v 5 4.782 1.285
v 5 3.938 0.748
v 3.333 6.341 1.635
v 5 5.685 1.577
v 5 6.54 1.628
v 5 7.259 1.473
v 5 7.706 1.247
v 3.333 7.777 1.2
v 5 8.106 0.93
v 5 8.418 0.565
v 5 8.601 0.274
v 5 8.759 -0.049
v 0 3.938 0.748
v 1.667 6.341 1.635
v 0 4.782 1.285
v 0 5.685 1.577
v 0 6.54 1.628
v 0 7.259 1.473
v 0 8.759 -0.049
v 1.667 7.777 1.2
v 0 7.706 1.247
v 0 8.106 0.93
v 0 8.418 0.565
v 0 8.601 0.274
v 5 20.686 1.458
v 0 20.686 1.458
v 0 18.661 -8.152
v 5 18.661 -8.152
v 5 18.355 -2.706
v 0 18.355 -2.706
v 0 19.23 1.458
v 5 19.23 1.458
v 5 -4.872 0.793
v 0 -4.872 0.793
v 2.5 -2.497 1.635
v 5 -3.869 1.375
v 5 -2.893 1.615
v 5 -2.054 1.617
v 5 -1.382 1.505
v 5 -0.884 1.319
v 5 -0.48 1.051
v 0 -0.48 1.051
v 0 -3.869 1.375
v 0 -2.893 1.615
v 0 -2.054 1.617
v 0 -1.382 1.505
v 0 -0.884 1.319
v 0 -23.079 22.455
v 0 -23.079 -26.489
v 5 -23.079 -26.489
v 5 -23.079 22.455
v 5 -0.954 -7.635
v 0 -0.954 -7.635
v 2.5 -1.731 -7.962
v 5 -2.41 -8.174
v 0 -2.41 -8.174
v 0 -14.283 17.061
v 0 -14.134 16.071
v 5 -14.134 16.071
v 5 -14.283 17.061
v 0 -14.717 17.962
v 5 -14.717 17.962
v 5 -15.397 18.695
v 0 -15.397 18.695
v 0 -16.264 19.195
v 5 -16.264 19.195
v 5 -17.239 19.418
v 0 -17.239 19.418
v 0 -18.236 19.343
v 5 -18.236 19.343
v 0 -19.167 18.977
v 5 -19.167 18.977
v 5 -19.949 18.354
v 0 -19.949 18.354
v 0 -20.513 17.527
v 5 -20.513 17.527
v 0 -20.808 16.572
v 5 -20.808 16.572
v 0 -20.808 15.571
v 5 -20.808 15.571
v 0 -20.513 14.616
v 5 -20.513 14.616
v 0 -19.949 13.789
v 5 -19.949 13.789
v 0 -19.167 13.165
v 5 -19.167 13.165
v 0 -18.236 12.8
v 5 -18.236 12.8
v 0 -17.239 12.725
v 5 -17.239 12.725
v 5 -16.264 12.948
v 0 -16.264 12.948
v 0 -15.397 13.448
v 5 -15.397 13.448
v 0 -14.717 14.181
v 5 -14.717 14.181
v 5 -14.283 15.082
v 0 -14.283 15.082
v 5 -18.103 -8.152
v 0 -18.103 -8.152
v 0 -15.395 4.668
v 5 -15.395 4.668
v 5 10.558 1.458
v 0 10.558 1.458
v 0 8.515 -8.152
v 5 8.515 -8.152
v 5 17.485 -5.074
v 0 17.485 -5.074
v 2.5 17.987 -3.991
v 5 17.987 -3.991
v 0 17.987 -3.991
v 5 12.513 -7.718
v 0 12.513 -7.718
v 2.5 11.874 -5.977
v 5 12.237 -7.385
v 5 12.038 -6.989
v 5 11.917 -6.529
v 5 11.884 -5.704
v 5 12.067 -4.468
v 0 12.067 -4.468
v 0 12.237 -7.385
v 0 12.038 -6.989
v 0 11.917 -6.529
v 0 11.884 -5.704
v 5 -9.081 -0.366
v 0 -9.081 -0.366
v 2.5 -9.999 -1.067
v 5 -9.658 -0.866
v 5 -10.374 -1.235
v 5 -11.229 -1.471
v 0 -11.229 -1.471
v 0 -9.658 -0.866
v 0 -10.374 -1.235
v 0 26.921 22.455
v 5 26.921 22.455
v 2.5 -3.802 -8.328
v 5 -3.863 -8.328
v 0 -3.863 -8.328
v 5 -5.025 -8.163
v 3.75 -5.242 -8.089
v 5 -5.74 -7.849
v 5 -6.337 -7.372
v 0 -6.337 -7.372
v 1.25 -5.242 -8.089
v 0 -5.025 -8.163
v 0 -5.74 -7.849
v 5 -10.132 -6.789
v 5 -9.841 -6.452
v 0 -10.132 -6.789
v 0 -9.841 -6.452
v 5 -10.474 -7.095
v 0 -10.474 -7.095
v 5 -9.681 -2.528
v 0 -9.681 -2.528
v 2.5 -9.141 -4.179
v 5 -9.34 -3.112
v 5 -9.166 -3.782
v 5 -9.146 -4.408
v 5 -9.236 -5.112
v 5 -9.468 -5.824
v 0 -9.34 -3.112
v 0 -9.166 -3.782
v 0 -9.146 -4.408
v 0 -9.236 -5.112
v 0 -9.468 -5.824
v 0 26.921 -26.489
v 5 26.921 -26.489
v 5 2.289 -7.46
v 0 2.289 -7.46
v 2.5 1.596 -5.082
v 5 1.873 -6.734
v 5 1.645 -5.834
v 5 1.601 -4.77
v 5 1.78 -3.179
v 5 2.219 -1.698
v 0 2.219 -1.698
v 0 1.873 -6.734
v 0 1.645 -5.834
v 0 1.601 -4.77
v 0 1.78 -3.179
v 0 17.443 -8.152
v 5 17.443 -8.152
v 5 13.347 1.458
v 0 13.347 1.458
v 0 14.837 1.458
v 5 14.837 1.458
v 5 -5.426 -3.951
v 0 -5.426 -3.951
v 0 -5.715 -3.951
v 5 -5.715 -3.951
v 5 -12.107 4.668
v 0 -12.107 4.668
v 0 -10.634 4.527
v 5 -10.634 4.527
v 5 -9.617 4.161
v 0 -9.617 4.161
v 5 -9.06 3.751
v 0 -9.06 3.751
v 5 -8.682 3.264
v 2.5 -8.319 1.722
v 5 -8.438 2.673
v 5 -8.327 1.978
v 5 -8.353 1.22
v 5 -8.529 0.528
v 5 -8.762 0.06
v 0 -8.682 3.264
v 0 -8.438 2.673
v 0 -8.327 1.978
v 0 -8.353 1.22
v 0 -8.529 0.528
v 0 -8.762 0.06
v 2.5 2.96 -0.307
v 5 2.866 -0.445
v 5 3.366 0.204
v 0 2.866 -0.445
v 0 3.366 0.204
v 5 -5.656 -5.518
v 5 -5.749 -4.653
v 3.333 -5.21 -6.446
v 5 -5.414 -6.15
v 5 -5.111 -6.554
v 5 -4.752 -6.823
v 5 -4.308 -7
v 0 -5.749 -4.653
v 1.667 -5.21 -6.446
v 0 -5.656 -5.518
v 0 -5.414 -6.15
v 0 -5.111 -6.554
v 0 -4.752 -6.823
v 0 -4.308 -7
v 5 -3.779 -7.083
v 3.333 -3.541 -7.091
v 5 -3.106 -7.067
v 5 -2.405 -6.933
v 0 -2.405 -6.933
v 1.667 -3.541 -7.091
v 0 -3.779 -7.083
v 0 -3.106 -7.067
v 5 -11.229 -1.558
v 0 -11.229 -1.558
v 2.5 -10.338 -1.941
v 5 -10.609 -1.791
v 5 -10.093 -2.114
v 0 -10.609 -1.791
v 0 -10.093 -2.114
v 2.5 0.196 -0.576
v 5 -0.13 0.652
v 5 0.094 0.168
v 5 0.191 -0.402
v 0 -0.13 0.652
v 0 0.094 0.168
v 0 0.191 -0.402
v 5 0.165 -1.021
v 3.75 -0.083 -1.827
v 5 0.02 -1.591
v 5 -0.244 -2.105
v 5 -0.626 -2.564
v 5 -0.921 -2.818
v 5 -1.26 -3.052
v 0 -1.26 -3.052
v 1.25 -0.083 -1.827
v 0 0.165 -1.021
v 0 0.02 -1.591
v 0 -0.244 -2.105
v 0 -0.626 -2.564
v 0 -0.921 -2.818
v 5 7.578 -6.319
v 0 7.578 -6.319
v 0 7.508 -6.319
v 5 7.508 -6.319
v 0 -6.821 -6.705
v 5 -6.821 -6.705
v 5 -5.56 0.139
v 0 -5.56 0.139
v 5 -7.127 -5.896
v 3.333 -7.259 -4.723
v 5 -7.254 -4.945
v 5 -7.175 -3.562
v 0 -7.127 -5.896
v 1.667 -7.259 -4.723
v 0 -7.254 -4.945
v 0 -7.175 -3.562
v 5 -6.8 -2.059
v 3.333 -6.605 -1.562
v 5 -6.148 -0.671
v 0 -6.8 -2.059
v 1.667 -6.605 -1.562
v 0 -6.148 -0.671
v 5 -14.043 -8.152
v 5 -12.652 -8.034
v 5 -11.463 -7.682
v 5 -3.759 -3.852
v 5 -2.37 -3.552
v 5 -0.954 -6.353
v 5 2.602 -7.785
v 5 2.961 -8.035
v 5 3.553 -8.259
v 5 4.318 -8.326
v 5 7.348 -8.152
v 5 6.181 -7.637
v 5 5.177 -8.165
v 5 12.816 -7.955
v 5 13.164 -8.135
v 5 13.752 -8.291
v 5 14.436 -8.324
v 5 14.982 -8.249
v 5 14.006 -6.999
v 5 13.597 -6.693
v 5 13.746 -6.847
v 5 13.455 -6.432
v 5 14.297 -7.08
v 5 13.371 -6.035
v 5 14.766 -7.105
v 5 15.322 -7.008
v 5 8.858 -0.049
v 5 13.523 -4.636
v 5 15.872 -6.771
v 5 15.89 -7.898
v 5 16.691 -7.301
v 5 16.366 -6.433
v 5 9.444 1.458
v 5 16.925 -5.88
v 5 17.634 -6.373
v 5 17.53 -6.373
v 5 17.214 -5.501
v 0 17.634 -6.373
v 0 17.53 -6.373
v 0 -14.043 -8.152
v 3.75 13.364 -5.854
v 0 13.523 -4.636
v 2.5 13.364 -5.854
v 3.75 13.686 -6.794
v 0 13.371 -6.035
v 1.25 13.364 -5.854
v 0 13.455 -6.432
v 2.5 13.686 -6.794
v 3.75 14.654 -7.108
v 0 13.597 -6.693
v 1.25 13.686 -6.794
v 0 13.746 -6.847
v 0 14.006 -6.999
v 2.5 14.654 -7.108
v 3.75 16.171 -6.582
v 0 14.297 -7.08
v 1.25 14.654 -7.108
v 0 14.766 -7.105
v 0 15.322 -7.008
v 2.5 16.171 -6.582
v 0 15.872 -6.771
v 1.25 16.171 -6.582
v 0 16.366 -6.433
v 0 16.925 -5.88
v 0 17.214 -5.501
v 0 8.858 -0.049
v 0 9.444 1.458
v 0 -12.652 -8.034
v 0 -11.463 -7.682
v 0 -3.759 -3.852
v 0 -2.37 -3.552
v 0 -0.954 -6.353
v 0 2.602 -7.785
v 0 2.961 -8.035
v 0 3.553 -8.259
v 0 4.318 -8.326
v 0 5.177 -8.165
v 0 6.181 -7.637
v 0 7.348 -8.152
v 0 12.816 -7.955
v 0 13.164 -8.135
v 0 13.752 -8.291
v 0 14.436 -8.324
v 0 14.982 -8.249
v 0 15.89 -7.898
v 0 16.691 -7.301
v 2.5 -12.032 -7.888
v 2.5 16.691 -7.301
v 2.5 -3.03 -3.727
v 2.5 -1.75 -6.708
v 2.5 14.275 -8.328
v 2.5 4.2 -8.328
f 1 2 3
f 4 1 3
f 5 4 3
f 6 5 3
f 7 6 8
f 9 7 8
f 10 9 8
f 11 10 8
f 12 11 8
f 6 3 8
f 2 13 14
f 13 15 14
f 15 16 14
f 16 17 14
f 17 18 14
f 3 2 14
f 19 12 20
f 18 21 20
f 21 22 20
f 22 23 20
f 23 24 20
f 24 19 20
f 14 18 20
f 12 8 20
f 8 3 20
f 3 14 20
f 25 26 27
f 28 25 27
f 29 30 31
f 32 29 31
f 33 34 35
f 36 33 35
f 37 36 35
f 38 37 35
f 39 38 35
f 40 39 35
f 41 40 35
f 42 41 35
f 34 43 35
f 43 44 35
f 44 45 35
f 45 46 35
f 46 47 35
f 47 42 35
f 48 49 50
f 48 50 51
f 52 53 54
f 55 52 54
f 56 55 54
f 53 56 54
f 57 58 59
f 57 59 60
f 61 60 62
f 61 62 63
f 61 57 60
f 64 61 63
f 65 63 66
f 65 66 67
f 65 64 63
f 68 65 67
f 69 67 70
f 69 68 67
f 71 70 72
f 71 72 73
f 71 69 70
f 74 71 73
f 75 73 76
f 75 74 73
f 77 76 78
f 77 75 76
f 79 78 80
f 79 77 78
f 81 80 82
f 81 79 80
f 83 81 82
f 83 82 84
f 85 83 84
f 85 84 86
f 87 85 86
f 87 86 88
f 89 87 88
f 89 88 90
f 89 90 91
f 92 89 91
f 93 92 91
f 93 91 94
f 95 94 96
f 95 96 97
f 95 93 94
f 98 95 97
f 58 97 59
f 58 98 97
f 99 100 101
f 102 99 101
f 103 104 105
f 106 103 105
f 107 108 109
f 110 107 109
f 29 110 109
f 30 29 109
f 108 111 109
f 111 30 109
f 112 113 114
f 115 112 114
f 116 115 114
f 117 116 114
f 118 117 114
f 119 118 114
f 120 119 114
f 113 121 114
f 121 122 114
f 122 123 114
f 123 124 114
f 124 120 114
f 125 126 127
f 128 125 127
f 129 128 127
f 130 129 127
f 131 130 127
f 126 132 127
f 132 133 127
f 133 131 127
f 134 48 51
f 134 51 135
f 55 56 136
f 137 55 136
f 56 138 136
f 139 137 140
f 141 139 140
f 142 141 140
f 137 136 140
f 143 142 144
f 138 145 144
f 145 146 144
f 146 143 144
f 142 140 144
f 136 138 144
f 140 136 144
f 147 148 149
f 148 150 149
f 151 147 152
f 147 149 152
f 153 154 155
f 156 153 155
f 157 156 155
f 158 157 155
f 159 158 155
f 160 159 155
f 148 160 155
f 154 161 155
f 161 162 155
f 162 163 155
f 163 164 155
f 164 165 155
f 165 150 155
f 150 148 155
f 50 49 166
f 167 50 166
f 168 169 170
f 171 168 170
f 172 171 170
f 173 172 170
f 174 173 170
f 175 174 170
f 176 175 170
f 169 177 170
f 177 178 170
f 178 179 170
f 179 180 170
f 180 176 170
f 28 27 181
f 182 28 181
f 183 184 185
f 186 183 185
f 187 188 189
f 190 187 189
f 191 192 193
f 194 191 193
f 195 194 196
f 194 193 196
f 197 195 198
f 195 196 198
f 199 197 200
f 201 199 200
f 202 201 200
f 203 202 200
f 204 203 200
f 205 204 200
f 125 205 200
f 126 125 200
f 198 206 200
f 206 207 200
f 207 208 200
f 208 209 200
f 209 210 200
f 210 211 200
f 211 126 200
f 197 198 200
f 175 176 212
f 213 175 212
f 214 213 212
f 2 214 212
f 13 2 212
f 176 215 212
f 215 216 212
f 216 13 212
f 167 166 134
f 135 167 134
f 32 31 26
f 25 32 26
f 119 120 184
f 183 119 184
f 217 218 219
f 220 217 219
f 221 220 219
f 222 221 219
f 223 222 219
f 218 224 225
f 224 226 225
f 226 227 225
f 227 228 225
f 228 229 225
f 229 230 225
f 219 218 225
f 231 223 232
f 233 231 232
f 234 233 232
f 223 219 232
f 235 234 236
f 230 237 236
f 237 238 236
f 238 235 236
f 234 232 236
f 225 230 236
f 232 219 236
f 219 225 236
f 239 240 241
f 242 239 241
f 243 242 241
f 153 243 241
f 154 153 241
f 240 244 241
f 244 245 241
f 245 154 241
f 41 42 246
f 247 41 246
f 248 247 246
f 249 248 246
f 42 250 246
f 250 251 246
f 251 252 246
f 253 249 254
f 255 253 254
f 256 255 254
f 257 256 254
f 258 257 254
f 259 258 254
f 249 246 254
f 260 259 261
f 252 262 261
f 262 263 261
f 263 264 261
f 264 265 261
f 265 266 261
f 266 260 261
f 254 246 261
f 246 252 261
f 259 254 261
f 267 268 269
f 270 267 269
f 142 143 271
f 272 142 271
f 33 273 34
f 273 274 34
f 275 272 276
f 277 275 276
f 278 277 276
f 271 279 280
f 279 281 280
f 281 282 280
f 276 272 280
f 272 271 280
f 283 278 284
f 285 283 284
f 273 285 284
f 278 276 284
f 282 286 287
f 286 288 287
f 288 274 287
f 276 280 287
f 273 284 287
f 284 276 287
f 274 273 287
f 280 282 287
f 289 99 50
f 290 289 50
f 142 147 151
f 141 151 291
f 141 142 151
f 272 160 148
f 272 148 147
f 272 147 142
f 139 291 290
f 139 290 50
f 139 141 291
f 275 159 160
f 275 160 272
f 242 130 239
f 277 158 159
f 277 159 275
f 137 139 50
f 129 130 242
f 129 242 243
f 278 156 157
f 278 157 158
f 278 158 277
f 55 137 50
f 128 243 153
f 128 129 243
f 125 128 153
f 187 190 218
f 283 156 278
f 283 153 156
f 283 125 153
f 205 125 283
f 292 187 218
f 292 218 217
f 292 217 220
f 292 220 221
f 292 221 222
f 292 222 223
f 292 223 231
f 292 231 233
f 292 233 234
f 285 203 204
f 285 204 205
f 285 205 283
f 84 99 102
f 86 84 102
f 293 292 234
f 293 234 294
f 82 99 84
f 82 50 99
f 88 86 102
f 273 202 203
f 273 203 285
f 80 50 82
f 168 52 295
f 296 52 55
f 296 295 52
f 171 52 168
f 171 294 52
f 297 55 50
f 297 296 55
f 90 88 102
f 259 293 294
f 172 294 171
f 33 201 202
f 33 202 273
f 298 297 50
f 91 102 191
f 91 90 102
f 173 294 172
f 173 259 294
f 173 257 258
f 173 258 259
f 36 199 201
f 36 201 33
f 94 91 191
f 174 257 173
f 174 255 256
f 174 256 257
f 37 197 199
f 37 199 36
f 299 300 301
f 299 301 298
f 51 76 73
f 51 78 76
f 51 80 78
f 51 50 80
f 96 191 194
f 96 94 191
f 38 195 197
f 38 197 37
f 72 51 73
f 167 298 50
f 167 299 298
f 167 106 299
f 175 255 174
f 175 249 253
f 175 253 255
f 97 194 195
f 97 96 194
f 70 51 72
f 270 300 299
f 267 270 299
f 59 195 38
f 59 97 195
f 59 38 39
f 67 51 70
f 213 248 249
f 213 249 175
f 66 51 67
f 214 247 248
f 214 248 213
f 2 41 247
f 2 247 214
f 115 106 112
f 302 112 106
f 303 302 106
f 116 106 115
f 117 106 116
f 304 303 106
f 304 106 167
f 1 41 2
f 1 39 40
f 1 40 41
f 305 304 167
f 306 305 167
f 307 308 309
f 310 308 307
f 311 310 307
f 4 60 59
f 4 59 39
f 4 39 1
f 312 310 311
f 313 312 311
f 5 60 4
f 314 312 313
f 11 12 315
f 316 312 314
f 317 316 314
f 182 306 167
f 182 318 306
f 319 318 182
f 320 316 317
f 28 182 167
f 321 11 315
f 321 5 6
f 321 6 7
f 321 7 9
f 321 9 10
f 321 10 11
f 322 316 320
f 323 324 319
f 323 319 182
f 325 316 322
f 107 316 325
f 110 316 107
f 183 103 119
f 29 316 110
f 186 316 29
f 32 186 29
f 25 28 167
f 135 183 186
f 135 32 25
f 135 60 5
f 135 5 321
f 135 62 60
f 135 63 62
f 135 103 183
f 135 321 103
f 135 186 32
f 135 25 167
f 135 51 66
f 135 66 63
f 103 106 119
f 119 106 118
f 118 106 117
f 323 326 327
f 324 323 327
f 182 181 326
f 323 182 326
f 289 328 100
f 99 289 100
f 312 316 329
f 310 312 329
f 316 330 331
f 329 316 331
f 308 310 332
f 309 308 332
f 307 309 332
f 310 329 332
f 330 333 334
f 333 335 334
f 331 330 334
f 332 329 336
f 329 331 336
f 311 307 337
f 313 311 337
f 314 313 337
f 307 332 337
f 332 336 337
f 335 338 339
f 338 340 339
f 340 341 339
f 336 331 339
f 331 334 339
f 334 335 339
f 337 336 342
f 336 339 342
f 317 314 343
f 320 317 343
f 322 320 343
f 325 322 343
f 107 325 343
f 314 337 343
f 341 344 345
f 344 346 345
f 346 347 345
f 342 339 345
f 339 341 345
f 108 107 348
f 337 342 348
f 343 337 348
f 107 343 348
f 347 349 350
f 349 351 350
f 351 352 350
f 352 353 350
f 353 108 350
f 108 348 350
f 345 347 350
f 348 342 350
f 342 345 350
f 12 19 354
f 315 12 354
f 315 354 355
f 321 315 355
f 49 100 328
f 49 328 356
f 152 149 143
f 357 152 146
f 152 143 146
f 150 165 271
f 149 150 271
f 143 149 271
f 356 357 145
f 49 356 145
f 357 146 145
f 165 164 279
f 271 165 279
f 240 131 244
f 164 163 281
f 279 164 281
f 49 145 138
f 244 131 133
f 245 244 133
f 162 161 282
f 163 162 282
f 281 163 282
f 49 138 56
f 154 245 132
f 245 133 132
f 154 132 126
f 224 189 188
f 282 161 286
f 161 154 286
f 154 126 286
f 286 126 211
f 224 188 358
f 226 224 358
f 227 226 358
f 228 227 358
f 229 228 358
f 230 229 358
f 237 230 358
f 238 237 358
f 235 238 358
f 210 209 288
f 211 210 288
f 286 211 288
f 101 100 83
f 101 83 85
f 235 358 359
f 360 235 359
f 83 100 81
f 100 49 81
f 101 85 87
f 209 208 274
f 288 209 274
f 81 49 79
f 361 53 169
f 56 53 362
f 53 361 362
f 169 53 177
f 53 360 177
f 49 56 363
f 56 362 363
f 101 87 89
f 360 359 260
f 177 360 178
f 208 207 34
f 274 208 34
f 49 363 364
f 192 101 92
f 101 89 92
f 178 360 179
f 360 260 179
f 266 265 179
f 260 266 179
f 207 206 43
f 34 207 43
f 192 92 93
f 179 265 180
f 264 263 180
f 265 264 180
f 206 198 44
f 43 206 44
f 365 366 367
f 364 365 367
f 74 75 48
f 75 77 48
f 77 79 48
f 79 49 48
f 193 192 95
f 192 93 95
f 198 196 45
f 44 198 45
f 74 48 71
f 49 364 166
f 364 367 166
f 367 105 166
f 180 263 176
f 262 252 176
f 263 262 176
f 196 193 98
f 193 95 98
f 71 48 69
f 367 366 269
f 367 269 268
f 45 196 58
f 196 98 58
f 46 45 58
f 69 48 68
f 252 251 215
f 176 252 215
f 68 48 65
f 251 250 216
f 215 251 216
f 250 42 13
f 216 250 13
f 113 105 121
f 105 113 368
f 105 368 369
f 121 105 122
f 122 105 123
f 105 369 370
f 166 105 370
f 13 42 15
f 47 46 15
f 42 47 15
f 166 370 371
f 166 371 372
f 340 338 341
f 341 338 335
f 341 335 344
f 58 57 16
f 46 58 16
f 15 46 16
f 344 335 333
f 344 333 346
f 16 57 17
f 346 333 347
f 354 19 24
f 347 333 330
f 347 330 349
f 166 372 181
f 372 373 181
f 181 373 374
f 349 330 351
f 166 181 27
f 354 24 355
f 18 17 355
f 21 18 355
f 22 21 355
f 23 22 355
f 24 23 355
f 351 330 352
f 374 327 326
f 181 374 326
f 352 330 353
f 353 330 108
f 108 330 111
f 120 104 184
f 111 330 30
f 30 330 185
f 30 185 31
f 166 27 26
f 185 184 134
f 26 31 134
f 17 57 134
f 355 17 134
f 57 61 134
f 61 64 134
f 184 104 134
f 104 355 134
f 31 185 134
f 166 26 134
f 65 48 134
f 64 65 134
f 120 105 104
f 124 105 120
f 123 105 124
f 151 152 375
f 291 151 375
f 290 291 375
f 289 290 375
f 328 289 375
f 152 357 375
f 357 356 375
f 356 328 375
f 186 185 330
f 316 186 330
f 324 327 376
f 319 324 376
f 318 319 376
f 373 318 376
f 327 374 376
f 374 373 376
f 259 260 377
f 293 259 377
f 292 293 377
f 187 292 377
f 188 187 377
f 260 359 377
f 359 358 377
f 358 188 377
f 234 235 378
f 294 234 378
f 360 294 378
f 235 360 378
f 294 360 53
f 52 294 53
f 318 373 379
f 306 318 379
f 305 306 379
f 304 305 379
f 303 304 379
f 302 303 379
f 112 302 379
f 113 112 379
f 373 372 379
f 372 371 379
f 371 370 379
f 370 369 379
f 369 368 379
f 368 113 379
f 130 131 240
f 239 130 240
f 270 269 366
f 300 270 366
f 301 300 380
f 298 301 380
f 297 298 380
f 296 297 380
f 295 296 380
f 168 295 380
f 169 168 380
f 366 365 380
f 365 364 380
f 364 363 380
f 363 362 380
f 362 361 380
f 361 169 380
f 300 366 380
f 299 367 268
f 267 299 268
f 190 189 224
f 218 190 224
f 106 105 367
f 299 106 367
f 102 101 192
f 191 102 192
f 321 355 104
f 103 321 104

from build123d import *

# Parameters (mm, degrees)
F0_W     = 50
F0_H     = 48.9445883323
F0_R     = 3.3555723101
F1_DEPTH = 5


with BuildPart() as f1:
    # F0 (on Right) → F1 (new body)
    with BuildSketch(Plane.YZ):
        with Locations((1.9210092723, -2.0170593634)):
            Rectangle(F0_W, F0_H)
        with BuildLine():
            add(Edge.make_bspline(
                [(-2.4102224398, -8.1740687344), (-3.0415094863, -8.3283833458), (-3.8018596622, -8.3283833458)],
                knots=[0, 0, 0, 1, 1, 1], degree=2))
            add(Edge.make_bspline(
                [(-3.8018596622, -8.3283833458), (-5.415148781, -8.3283833458), (-6.3368278688, -7.3716327553)],
                knots=[0, 0, 0, 1, 1, 1], degree=2))
            add(Edge.make_bspline(
                [(-6.3368278688, -7.3716327553), (-7.2585069566, -6.4148821649), (-7.2585069566, -4.7230328804)],
                knots=[0, 0, 0, 1, 1, 1], degree=2))
            add(Edge.make_bspline(
                [(-7.2585069566, -4.7230328804), (-7.2585069566, -3.0760751192), (-6.6047741485, -1.5623890678)],
                knots=[0, 0, 0, 1, 1, 1], degree=2))
            add(Edge.make_bspline(
                [(-6.6047741485, -1.5623890678), (-5.9510413404, -0.0487030164), (-4.872241921, 0.7930130455)],
                knots=[0, 0, 0, 1, 1, 1], degree=2))
            add(Edge.make_bspline(
                [(-4.872241921, 0.7930130455), (-3.7934425016, 1.6347291075), (-2.4971997662, 1.6347291075)],
                knots=[0, 0, 0, 1, 1, 1], degree=2))
            add(Edge.make_bspline(
                [(-2.4971997662, 1.6347291075), (-1.1560655075, 1.6347291075), (-0.4798869378, 1.0511393045)],
                knots=[0, 0, 0, 1, 1, 1], degree=2))
            add(Edge.make_bspline(
                [(-0.4798869378, 1.0511393045), (0.196291632, 0.4675495016), (0.196291632, -0.5761784152)],
                knots=[0, 0, 0, 1, 1, 1], degree=2))
            add(Edge.make_bspline(
                [(0.196291632, -0.5761784152), (0.196291632, -2.1529931713), (-1.2598771552, -3.0522264975)],
                knots=[0, 0, 0, 1, 1, 1], degree=2))
            add(Edge.make_bspline(
                [(-1.2598771552, -3.0522264975), (-2.7160459423, -3.9514598236), (-5.4263716618, -3.9514598236)],
                knots=[0, 0, 0, 1, 1, 1], degree=2))
            Line((-5.4263716618, -3.9514598236), (-5.7153608431, -3.9514598236))
            Line((-5.7153608431, -3.9514598236), (-5.7490294855, -4.6528898753))
            add(Edge.make_bspline(
                [(-5.7490294855, -4.6528898753), (-5.7490294855, -5.8004294397), (-5.2103312059, -6.4457450872)],
                knots=[0, 0, 0, 1, 1, 1], degree=2))
            add(Edge.make_bspline(
                [(-5.2103312059, -6.4457450872), (-4.6716329263, -7.0910607347), (-3.540927683, -7.0910607347)],
                knots=[0, 0, 0, 1, 1, 1], degree=2))
            add(Edge.make_bspline(
                [(-3.540927683, -7.0910607347), (-2.9882008024, -7.0910607347), (-2.4046109994, -6.932537543)],
                knots=[0, 0, 0, 1, 1, 1], degree=2))
            add(Edge.make_bspline(
                [(-2.4046109994, -6.932537543), (-1.8210211965, -6.7740143514), (-0.9540536527, -6.3531563204)],
                knots=[0, 0, 0, 1, 1, 1], degree=2))
            Line((-0.9540536527, -6.3531563204), (-0.9540536527, -7.6353704547))
            add(Edge.make_bspline(
                [(-0.9540536527, -7.6353704547), (-1.7789353934, -8.019754123), (-2.4102224398, -8.1740687344)],
                knots=[0, 0, 0, 1, 1, 1], degree=2))
        make_face(mode=Mode.SUBTRACT)
        with BuildLine():
            add(Edge.make_bspline(
                [(3.9377195273, 0.7481215222), (5.033353268, 1.6347291075), (6.3408188842, 1.6347291075)],
                knots=[0, 0, 0, 1, 1, 1], degree=2))
            add(Edge.make_bspline(
                [(6.3408188842, 1.6347291075), (7.1460605834, 1.6347291075), (7.7773476299, 1.1998424755)],
                knots=[0, 0, 0, 1, 1, 1], degree=2))
            add(Edge.make_bspline(
                [(7.7773476299, 1.1998424755), (8.4086346764, 0.7649558435), (8.7593497022, -0.0487030164)],
                knots=[0, 0, 0, 1, 1, 1], degree=2))
            Line((8.7593497022, -0.0487030164), (8.8575499094, -0.0487030164))
            Line((8.8575499094, -0.0487030164), (9.4439454326, 1.4579687345))
            Line((9.4439454326, 1.4579687345), (10.5578163545, 1.4579687345))
            Line((10.5578163545, 1.4579687345), (8.5152520442, -8.1516229727))
            Line((8.5152520442, -8.1516229727), (7.3480724383, -8.1516229727))
            Line((7.3480724383, -8.1516229727), (7.5781414952, -6.3194876779))
            Line((7.5781414952, -6.3194876779), (7.5079984901, -6.3194876779))
            add(Edge.make_bspline(
                [(7.5079984901, -6.3194876779), (5.9367951745, -8.3283833458), (4.2000543666, -8.3283833458)],
                knots=[0, 0, 0, 1, 1, 1], degree=2))
            add(Edge.make_bspline(
                [(4.2000543666, -8.3283833458), (2.982371797, -8.3283833458), (2.289358906, -7.4600129418)],
                knots=[0, 0, 0, 1, 1, 1], degree=2))
            add(Edge.make_bspline(
                [(2.289358906, -7.4600129418), (1.596346015, -6.5916425379), (1.596346015, -5.0821650669)],
                knots=[0, 0, 0, 1, 1, 1], degree=2))
            add(Edge.make_bspline(
                [(1.596346015, -5.0821650669), (1.596346015, -3.2584469326), (2.2192159009, -1.6984664978)],
                knots=[0, 0, 0, 1, 1, 1], degree=2))
            add(Edge.make_bspline(
                [(2.2192159009, -1.6984664978), (2.8420857867, -0.138486063), (3.9377195273, 0.7481215222)],
                knots=[0, 0, 0, 1, 1, 1], degree=2))
        make_face(mode=Mode.SUBTRACT)
        with BuildLine():
            Line((13.3467022398, 1.4579687345), (14.8365396694, 1.4579687345))
            Line((14.8365396694, 1.4579687345), (13.5234626128, -4.636055554))
            add(Edge.make_bspline(
                [(13.5234626128, -4.636055554), (13.363536561, -5.4160457714), (13.363536561, -5.8537381236)],
                knots=[0, 0, 0, 1, 1, 1], degree=2))
            add(Edge.make_bspline(
                [(13.363536561, -5.8537381236), (13.363536561, -7.1078950559), (14.654167856, -7.1078950559)],
                knots=[0, 0, 0, 1, 1, 1], degree=2))
            add(Edge.make_bspline(
                [(14.654167856, -7.1078950559), (15.4257409128, -7.1078950559), (16.1706596276, -6.5818225172)],
                knots=[0, 0, 0, 1, 1, 1], degree=2))
            add(Edge.make_bspline(
                [(16.1706596276, -6.5818225172), (16.9155783424, -6.0557499785), (17.4851395443, -5.0737479062)],
                knots=[0, 0, 0, 1, 1, 1], degree=2))
            add(Edge.make_bspline(
                [(17.4851395443, -5.0737479062), (18.0547007462, -4.091745834), (18.3549128083, -2.705720052)],
                knots=[0, 0, 0, 1, 1, 1], degree=2))
            Line((18.3549128083, -2.705720052), (19.2302975128, 1.4579687345))
            Line((19.2302975128, 1.4579687345), (20.6864662999, 1.4579687345))
            Line((20.6864662999, 1.4579687345), (18.6607363108, -8.1516229727))
            Line((18.6607363108, -8.1516229727), (17.4430537412, -8.1516229727))
            Line((17.4430537412, -8.1516229727), (17.6338427153, -6.3727963618))
            Line((17.6338427153, -6.3727963618), (17.5300310676, -6.3727963618))
            add(Edge.make_bspline(
                [(17.5300310676, -6.3727963618), (16.6714806845, -7.4670272424), (15.8900876069, -7.8977052941)],
                knots=[0, 0, 0, 1, 1, 1], degree=2))
            add(Edge.make_bspline(
                [(15.8900876069, -7.8977052941), (15.1086945294, -8.3283833458), (14.2753956281, -8.3283833458)],
                knots=[0, 0, 0, 1, 1, 1], degree=2))
            add(Edge.make_bspline(
                [(14.2753956281, -8.3283833458), (13.1531075455, -8.3283833458), (12.5134033384, -7.7181392008)],
                knots=[0, 0, 0, 1, 1, 1], degree=2))
            add(Edge.make_bspline(
                [(12.5134033384, -7.7181392008), (11.8736991314, -7.1078950559), (11.8736991314, -5.9771898127)],
                knots=[0, 0, 0, 1, 1, 1], degree=2))
            add(Edge.make_bspline(
                [(11.8736991314, -5.9771898127), (11.8736991314, -5.4328800927), (12.0672938256, -4.4677123416)],
                knots=[0, 0, 0, 1, 1, 1], degree=2))
            Line((12.0672938256, -4.4677123416), (13.3467022398, 1.4579687345))
        make_face(mode=Mode.SUBTRACT)
        with BuildLine():
            Line((-15.3950955554, 4.6677126507), (-12.1067914734, 4.6677126507))
            add(Edge.make_bspline(
                [(-12.1067914734, 4.6677126507), (-8.3190691947, 4.6677126507), (-8.3190691947, 1.7217064339)],
                knots=[0, 0, 0, 1, 1, 1], degree=2))
            add(Edge.make_bspline(
                [(-8.3190691947, 1.7217064339), (-8.3190691947, 0.4843838228), (-9.0808222307, -0.3657493998)],
                knots=[0, 0, 0, 1, 1, 1], degree=2))
            add(Edge.make_bspline(
                [(-9.0808222307, -0.3657493998), (-9.8425752668, -1.2158826223), (-11.2286010488, -1.4712031611)],
                knots=[0, 0, 0, 1, 1, 1], degree=2))
            Line((-11.2286010488, -1.4712031611), (-11.2286010488, -1.5581804875))
            add(Edge.make_bspline(
                [(-11.2286010488, -1.5581804875), (-10.2213474947, -1.8387525082), (-9.6812463549, -2.5275568188)],
                knots=[0, 0, 0, 1, 1, 1], degree=2))
            add(Edge.make_bspline(
                [(-9.6812463549, -2.5275568188), (-9.1411452152, -3.2163611295), (-9.1411452152, -4.1787231604)],
                knots=[0, 0, 0, 1, 1, 1], degree=2))
            add(Edge.make_bspline(
                [(-9.1411452152, -4.1787231604), (-9.1411452152, -6.0389156573), (-10.4738623133, -7.095269315)],
                knots=[0, 0, 0, 1, 1, 1], degree=2))
            add(Edge.make_bspline(
                [(-10.4738623133, -7.095269315), (-11.8065794113, -8.1516229727), (-14.0427384159, -8.1516229727)],
                knots=[0, 0, 0, 1, 1, 1], degree=2))
            Line((-14.0427384159, -8.1516229727), (-18.1026155547, -8.1516229727))
            Line((-18.1026155547, -8.1516229727), (-15.3950955554, 4.6677126507))
        make_face(mode=Mode.SUBTRACT)
        with Locations((-17.4894966185, 16.0714294761)):
            Circle(F0_R, mode=Mode.SUBTRACT)
    extrude(amount=F1_DEPTH)


solid = f1.part
